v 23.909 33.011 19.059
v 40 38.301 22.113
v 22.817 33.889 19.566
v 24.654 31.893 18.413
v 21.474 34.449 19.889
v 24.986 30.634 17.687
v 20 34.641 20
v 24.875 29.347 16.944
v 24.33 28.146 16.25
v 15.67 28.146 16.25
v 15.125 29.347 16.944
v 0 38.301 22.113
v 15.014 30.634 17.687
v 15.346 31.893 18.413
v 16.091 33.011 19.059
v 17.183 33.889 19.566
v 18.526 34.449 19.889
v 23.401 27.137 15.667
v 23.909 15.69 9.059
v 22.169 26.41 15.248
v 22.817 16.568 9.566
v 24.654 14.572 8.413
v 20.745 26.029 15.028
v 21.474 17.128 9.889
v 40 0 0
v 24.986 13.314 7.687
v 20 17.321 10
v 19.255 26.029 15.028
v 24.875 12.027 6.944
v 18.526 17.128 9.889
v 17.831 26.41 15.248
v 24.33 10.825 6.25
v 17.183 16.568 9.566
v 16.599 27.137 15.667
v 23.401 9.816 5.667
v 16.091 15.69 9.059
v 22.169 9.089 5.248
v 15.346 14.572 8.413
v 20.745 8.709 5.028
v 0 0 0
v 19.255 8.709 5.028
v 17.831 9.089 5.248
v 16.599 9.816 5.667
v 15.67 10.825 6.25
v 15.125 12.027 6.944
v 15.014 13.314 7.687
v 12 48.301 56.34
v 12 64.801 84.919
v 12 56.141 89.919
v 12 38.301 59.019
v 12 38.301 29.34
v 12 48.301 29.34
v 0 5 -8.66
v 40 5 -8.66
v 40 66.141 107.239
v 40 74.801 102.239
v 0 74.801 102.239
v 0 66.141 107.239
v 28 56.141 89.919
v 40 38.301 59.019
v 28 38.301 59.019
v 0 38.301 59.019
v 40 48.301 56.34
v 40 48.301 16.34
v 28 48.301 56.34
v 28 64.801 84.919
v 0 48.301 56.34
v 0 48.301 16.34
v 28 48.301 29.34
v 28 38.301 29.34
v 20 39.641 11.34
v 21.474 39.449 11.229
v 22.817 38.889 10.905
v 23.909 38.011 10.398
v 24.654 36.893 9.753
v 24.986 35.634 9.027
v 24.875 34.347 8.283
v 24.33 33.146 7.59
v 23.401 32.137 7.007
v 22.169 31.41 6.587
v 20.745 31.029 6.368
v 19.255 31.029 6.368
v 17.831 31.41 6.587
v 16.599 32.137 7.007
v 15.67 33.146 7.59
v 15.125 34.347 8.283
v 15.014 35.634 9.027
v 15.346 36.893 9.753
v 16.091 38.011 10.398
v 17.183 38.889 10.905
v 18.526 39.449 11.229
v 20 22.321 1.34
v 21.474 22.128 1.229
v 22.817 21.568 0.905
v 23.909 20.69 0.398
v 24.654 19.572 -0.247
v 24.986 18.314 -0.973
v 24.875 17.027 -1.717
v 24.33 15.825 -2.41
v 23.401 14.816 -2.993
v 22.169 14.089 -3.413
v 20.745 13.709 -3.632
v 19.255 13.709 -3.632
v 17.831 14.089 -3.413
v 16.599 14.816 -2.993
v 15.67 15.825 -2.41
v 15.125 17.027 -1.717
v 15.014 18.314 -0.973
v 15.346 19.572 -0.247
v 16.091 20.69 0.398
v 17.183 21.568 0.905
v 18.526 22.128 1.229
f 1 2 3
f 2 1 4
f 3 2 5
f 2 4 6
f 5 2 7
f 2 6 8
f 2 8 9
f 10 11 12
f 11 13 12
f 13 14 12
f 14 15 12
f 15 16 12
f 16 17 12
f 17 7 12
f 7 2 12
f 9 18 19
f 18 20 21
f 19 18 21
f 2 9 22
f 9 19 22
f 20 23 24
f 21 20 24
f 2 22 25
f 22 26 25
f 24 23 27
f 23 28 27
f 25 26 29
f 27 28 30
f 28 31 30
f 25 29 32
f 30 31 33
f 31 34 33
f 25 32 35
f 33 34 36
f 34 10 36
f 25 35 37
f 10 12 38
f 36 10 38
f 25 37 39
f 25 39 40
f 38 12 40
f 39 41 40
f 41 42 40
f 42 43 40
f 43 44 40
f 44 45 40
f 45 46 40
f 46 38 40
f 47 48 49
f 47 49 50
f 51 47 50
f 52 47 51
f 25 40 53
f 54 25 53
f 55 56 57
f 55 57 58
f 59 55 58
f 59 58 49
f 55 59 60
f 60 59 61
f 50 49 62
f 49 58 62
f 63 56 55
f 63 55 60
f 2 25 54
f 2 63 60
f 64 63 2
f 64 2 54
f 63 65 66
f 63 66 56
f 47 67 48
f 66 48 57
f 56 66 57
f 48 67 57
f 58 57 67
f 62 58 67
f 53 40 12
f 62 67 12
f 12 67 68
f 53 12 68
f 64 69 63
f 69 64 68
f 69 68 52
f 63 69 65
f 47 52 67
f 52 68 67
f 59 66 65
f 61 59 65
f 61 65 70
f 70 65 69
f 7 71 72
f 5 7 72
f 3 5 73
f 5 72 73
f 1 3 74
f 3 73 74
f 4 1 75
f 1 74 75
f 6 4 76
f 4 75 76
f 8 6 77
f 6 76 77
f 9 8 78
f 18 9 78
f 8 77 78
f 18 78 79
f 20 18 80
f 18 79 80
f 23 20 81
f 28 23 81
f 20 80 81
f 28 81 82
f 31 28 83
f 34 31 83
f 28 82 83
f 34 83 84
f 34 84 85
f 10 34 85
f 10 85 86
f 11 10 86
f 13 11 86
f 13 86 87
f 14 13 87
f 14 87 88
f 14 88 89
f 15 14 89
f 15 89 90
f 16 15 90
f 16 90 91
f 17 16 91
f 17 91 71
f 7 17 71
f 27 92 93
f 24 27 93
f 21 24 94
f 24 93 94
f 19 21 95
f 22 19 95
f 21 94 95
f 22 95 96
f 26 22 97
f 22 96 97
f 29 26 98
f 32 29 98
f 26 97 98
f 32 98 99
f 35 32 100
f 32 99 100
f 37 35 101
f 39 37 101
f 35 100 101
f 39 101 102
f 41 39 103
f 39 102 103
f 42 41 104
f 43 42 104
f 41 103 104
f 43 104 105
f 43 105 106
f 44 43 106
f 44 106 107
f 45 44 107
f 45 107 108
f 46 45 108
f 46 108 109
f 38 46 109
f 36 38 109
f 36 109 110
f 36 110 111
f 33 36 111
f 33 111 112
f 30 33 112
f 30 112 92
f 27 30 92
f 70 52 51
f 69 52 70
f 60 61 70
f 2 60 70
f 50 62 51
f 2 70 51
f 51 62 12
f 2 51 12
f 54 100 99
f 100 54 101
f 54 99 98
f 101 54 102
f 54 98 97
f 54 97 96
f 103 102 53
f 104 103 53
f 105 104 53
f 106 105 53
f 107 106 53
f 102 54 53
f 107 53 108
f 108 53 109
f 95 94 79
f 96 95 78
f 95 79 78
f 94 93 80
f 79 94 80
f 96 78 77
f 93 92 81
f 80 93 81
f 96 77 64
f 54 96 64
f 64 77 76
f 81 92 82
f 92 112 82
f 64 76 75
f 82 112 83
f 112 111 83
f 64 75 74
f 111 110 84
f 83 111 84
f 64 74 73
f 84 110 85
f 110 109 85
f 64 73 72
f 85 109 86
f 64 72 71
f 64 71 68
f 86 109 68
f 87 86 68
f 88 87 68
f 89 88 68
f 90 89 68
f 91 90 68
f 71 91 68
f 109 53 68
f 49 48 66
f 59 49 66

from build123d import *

# Parameters (mm, degrees)
BOSS_EXTRUDE1_DEPTH = 40
CUT_EXTRUDE1_REACH  = 143.085
SKETCH2_R           = 5
CUT_EXTRUDE2_REACH  = 138.298
SKETCH3_W           = 16
SKETCH3_H           = 33
SKETCH4_W           = 16
SKETCH4_H           = 32
CUT_EXTRUDE4_DEPTH  = 40


with BuildPart() as part:
    # Sketch1 → Boss-Extrude1 (new body)
    with BuildSketch(Plane(origin=(0, 0, 0), x_dir=(0, 0, -1), z_dir=(1, 0, 0))):
        Polygon((-102.239092363, 74.801270189), (-107.239092363, 66.141016151), (-59.019237886, 38.301270189), (-22.113248654, 38.301270189), (0, 0), (8.660254038, 5), (-16.339745962, 48.301270189), (-56.339745962, 48.301270189), align=None)
    extrude(amount=BOSS_EXTRUDE1_DEPTH)

    # Sketch2 → Cut-Extrude1 (cut, up to next)
    with BuildSketch(Plane(origin=(0, 5, -8.660254038), x_dir=(-1, 0, 0), z_dir=(0, 0.4999999999999983, -0.8660254037844396)), mode=Mode.PRIVATE) as cut_extrude1_sk1:
        with Locations((-20, 35)):
            Circle(SKETCH2_R)
    cut_extrude1_tool1 = extrude(cut_extrude1_sk1.sketch, amount=-CUT_EXTRUDE1_REACH, mode=Mode.PRIVATE) & part.part
    # Sketch2 → Cut-Extrude1 (cut, up to next)
    with BuildSketch(Plane(origin=(0, 5, -8.660254038), x_dir=(-1, 0, 0), z_dir=(0, 0.4999999999999983, -0.8660254037844396)), mode=Mode.PRIVATE) as cut_extrude1_sk2:
        with Locations((-20, 15)):
            Circle(SKETCH2_R)
    cut_extrude1_tool2 = extrude(cut_extrude1_sk2.sketch, amount=-CUT_EXTRUDE1_REACH, mode=Mode.PRIVATE) & part.part
    add(cut_extrude1_tool1.solids().sort_by_distance((20, 35.310889, 8.839746))[0], mode=Mode.SUBTRACT)
    add(cut_extrude1_tool2.solids().sort_by_distance((20, 17.990381, -1.160254))[0], mode=Mode.SUBTRACT)

    # Sketch3 → Cut-Extrude2 (cut, up to next)
    with BuildSketch(Plane(origin=(0, 11.830127019, -6.830127019), x_dir=(1, 0, 0), z_dir=(0, 0.8660254037844383, -0.5000000000000009)), mode=Mode.PRIVATE) as cut_extrude2_sk1:
        with Locations((20, -89.442286341)):
            Rectangle(SKETCH3_W, SKETCH3_H)
    cut_extrude2_tool1 = extrude(cut_extrude2_sk1.sketch, amount=-CUT_EXTRUDE2_REACH, mode=Mode.PRIVATE) & part.part
    add(cut_extrude2_tool1.solids().sort_by_distance((20, 56.55127, 70.629165))[0], mode=Mode.SUBTRACT)

    # Sketch4 → Cut-Extrude4 (cut)
    with BuildSketch(Plane(origin=(0, 48.301270189, 0), x_dir=(1, 0, 0), z_dir=(0, 1, 0))):
        with Locations((20, -45.339745962)):
            Rectangle(SKETCH4_W, SKETCH4_H)
    extrude(amount=-CUT_EXTRUDE4_DEPTH, mode=Mode.SUBTRACT)


solid = part.part
